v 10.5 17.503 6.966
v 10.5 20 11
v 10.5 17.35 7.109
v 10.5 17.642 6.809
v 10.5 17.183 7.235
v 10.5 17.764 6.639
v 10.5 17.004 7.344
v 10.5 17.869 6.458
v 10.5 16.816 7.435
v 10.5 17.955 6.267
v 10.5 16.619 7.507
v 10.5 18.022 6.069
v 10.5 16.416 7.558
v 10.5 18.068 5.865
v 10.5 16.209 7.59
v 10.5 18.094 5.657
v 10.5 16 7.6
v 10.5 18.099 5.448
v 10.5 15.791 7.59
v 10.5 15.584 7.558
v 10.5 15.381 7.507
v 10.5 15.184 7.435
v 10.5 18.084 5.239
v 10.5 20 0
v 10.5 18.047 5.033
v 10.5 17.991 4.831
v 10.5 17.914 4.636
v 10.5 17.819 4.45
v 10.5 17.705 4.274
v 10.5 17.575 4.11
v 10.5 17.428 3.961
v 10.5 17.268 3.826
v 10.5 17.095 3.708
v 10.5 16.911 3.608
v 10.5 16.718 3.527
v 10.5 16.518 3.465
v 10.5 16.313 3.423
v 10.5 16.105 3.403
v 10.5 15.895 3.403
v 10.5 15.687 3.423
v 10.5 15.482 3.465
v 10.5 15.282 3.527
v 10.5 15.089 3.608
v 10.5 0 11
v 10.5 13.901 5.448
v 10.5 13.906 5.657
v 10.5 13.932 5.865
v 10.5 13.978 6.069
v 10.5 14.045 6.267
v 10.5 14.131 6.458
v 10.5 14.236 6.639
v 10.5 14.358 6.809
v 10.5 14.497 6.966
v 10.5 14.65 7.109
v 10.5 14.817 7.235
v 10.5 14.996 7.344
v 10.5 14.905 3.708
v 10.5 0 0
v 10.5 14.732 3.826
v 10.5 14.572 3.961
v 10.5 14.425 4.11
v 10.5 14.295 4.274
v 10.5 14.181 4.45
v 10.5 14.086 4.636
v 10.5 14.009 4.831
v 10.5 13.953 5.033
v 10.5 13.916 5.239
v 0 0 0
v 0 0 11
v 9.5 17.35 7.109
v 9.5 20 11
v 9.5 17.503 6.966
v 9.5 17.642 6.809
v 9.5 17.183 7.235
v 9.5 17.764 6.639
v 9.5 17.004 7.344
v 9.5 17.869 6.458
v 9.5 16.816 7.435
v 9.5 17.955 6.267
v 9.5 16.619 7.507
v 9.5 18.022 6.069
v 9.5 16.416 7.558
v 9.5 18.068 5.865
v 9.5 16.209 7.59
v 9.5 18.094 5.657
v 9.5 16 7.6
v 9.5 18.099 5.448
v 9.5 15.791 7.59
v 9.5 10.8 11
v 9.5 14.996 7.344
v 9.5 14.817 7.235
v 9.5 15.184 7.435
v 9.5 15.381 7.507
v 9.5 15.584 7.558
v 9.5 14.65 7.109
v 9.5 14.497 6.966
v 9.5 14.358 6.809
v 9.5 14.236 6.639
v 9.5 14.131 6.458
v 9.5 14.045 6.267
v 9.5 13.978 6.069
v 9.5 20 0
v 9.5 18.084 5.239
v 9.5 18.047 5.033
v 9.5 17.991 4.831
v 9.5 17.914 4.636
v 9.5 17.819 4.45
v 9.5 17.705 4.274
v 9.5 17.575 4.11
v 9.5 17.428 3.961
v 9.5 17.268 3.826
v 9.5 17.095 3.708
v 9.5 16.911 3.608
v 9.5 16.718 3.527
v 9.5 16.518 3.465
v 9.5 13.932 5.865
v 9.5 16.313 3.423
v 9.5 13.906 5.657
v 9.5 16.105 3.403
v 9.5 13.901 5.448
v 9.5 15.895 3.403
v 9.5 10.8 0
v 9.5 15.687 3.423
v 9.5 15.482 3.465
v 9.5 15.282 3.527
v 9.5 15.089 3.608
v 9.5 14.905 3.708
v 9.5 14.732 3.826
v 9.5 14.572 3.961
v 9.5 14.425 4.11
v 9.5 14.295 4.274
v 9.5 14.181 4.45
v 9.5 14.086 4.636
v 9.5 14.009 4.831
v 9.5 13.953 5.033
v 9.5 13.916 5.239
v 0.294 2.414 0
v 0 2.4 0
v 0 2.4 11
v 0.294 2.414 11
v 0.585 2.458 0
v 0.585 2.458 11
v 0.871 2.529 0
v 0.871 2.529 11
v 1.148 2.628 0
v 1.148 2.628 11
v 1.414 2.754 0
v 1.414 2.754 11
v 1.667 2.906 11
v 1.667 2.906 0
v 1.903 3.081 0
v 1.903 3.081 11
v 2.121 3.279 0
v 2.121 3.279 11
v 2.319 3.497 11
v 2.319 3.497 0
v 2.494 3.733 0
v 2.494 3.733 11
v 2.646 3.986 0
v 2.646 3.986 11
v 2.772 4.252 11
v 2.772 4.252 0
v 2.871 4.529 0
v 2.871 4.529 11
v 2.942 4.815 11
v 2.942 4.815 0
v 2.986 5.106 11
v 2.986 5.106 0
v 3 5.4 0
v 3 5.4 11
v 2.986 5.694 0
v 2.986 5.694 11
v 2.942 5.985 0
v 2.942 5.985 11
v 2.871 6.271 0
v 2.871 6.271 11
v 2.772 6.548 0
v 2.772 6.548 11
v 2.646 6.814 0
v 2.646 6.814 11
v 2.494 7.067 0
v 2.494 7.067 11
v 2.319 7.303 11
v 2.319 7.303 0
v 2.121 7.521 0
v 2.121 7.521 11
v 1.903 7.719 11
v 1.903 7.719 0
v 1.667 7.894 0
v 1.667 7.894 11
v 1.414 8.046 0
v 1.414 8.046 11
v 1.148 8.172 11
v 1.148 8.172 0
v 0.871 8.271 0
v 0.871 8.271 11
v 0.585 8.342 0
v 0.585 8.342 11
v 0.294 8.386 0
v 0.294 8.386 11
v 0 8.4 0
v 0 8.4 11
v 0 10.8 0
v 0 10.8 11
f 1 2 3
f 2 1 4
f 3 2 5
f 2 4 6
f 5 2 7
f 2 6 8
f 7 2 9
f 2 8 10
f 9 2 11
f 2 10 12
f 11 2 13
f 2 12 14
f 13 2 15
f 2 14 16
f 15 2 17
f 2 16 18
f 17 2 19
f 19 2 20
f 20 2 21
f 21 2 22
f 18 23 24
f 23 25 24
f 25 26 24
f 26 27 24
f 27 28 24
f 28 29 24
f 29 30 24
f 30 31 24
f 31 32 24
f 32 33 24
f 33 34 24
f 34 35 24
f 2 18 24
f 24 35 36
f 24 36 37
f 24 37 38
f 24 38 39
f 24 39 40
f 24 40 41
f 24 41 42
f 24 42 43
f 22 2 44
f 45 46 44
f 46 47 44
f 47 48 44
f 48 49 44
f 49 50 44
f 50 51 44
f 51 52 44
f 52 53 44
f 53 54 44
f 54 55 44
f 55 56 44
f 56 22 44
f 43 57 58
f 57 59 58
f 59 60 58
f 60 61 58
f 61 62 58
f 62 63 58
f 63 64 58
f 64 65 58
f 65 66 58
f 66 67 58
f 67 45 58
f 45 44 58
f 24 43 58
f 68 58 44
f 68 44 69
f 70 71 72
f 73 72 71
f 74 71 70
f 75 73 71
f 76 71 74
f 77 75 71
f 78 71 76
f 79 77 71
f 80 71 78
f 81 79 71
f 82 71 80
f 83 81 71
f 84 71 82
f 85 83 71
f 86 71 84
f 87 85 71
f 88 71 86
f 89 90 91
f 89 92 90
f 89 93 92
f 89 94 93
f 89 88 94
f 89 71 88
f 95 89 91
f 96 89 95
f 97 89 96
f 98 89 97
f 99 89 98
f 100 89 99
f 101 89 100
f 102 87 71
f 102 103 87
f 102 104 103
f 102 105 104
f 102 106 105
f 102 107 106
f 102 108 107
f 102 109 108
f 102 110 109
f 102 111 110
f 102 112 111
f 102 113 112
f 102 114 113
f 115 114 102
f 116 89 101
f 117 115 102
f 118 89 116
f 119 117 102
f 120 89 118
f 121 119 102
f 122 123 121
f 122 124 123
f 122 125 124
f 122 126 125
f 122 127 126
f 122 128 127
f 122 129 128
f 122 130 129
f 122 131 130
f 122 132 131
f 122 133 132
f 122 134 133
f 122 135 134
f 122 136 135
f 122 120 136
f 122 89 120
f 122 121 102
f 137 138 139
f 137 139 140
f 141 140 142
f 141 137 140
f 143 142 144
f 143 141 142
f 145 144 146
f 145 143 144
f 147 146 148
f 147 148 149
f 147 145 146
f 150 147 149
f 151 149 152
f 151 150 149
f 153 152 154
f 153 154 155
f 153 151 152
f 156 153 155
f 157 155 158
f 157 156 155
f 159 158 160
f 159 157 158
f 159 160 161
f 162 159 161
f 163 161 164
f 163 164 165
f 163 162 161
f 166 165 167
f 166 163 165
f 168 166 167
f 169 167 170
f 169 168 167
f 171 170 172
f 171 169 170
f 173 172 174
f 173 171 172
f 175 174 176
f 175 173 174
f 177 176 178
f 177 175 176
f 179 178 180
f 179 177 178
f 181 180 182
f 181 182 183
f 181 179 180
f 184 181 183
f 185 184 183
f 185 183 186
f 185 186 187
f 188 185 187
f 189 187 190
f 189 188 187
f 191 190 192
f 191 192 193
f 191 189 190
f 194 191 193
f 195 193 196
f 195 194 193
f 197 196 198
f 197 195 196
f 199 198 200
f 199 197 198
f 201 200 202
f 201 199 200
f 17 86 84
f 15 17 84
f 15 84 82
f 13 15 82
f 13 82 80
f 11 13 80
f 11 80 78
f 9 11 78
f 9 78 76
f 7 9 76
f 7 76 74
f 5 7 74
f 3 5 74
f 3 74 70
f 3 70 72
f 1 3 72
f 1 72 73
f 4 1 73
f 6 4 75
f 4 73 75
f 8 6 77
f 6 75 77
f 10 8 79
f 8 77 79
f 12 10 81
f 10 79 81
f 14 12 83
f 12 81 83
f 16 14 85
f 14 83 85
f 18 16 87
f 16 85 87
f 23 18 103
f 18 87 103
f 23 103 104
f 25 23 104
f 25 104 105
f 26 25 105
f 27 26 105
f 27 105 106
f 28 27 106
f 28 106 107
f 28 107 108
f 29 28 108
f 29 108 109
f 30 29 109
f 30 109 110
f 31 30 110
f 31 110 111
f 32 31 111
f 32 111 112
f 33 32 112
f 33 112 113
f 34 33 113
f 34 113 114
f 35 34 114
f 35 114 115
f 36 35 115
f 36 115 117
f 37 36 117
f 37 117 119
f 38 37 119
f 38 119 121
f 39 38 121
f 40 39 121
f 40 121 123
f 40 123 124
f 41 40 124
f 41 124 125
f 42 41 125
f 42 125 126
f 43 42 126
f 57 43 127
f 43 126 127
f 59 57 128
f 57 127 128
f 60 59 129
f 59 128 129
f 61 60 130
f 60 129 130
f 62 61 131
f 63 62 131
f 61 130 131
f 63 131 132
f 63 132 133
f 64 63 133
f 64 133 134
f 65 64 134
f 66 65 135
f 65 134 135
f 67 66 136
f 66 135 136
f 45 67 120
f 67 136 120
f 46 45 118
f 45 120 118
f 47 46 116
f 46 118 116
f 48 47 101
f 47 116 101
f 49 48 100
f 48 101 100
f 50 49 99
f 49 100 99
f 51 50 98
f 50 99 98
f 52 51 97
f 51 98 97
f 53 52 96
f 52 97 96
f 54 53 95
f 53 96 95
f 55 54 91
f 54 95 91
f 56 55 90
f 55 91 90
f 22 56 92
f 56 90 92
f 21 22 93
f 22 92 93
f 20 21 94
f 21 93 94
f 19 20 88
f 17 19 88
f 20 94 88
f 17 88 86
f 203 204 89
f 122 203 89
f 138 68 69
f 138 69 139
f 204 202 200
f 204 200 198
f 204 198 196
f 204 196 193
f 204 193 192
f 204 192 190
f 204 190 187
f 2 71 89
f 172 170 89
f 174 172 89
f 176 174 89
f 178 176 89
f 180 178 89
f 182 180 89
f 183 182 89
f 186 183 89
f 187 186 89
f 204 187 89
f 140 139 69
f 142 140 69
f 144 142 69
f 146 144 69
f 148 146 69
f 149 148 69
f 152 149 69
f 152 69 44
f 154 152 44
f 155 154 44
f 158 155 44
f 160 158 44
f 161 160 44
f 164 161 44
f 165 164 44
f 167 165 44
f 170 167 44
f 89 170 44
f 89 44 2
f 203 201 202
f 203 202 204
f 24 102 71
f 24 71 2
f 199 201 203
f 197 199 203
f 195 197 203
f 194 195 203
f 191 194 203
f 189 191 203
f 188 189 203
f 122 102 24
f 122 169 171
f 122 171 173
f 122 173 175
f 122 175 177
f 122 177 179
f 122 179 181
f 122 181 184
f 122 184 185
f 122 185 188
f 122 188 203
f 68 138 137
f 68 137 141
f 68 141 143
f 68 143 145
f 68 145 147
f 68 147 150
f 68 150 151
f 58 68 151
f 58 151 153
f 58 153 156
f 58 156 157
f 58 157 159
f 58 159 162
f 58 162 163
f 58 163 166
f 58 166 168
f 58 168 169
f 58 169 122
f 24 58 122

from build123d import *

# Parameters (mm, degrees)
BOSS_EXTRUDE1_DEPTH = 11
SKETCH2_W           = 1
SKETCH2_H           = 11
BOSS_EXTRUDE2_DEPTH = 9.2
SKETCH3_R           = 2.1
CUT_EXTRUDE1_DEPTH  = 10


with BuildPart() as part:
    # Sketch1 → Boss-Extrude1 (new body)
    with BuildSketch(Plane.XY):
        with BuildLine():
            Line((0, 0), (0, 2.4))
            ThreePointArc((0, 2.4), (3, 5.4), (0, 8.4))
            Line((0, 8.4), (0, 10.8))
            Line((0, 10.8), (10.5, 10.8))
            Line((10.5, 10.8), (10.5, 0))
            Line((10.5, 0), (0, 0))
        make_face()
    extrude(amount=BOSS_EXTRUDE1_DEPTH)

    # Sketch2 → Boss-Extrude2 (add)
    with BuildSketch(Plane(origin=(0, 10.8, 0), x_dir=(1, 0, 0), z_dir=(0, 1, 0))):
        with Locations((10, -5.5)):
            Rectangle(SKETCH2_W, SKETCH2_H)
    extrude(amount=BOSS_EXTRUDE2_DEPTH)

    # Sketch3 → Cut-Extrude1 (cut)
    with BuildSketch(Plane.ZY.offset(-9.5)):
        with Locations((5.5, 16)):
            Circle(SKETCH3_R)
    extrude(amount=-CUT_EXTRUDE1_DEPTH, mode=Mode.SUBTRACT)


solid = part.part
